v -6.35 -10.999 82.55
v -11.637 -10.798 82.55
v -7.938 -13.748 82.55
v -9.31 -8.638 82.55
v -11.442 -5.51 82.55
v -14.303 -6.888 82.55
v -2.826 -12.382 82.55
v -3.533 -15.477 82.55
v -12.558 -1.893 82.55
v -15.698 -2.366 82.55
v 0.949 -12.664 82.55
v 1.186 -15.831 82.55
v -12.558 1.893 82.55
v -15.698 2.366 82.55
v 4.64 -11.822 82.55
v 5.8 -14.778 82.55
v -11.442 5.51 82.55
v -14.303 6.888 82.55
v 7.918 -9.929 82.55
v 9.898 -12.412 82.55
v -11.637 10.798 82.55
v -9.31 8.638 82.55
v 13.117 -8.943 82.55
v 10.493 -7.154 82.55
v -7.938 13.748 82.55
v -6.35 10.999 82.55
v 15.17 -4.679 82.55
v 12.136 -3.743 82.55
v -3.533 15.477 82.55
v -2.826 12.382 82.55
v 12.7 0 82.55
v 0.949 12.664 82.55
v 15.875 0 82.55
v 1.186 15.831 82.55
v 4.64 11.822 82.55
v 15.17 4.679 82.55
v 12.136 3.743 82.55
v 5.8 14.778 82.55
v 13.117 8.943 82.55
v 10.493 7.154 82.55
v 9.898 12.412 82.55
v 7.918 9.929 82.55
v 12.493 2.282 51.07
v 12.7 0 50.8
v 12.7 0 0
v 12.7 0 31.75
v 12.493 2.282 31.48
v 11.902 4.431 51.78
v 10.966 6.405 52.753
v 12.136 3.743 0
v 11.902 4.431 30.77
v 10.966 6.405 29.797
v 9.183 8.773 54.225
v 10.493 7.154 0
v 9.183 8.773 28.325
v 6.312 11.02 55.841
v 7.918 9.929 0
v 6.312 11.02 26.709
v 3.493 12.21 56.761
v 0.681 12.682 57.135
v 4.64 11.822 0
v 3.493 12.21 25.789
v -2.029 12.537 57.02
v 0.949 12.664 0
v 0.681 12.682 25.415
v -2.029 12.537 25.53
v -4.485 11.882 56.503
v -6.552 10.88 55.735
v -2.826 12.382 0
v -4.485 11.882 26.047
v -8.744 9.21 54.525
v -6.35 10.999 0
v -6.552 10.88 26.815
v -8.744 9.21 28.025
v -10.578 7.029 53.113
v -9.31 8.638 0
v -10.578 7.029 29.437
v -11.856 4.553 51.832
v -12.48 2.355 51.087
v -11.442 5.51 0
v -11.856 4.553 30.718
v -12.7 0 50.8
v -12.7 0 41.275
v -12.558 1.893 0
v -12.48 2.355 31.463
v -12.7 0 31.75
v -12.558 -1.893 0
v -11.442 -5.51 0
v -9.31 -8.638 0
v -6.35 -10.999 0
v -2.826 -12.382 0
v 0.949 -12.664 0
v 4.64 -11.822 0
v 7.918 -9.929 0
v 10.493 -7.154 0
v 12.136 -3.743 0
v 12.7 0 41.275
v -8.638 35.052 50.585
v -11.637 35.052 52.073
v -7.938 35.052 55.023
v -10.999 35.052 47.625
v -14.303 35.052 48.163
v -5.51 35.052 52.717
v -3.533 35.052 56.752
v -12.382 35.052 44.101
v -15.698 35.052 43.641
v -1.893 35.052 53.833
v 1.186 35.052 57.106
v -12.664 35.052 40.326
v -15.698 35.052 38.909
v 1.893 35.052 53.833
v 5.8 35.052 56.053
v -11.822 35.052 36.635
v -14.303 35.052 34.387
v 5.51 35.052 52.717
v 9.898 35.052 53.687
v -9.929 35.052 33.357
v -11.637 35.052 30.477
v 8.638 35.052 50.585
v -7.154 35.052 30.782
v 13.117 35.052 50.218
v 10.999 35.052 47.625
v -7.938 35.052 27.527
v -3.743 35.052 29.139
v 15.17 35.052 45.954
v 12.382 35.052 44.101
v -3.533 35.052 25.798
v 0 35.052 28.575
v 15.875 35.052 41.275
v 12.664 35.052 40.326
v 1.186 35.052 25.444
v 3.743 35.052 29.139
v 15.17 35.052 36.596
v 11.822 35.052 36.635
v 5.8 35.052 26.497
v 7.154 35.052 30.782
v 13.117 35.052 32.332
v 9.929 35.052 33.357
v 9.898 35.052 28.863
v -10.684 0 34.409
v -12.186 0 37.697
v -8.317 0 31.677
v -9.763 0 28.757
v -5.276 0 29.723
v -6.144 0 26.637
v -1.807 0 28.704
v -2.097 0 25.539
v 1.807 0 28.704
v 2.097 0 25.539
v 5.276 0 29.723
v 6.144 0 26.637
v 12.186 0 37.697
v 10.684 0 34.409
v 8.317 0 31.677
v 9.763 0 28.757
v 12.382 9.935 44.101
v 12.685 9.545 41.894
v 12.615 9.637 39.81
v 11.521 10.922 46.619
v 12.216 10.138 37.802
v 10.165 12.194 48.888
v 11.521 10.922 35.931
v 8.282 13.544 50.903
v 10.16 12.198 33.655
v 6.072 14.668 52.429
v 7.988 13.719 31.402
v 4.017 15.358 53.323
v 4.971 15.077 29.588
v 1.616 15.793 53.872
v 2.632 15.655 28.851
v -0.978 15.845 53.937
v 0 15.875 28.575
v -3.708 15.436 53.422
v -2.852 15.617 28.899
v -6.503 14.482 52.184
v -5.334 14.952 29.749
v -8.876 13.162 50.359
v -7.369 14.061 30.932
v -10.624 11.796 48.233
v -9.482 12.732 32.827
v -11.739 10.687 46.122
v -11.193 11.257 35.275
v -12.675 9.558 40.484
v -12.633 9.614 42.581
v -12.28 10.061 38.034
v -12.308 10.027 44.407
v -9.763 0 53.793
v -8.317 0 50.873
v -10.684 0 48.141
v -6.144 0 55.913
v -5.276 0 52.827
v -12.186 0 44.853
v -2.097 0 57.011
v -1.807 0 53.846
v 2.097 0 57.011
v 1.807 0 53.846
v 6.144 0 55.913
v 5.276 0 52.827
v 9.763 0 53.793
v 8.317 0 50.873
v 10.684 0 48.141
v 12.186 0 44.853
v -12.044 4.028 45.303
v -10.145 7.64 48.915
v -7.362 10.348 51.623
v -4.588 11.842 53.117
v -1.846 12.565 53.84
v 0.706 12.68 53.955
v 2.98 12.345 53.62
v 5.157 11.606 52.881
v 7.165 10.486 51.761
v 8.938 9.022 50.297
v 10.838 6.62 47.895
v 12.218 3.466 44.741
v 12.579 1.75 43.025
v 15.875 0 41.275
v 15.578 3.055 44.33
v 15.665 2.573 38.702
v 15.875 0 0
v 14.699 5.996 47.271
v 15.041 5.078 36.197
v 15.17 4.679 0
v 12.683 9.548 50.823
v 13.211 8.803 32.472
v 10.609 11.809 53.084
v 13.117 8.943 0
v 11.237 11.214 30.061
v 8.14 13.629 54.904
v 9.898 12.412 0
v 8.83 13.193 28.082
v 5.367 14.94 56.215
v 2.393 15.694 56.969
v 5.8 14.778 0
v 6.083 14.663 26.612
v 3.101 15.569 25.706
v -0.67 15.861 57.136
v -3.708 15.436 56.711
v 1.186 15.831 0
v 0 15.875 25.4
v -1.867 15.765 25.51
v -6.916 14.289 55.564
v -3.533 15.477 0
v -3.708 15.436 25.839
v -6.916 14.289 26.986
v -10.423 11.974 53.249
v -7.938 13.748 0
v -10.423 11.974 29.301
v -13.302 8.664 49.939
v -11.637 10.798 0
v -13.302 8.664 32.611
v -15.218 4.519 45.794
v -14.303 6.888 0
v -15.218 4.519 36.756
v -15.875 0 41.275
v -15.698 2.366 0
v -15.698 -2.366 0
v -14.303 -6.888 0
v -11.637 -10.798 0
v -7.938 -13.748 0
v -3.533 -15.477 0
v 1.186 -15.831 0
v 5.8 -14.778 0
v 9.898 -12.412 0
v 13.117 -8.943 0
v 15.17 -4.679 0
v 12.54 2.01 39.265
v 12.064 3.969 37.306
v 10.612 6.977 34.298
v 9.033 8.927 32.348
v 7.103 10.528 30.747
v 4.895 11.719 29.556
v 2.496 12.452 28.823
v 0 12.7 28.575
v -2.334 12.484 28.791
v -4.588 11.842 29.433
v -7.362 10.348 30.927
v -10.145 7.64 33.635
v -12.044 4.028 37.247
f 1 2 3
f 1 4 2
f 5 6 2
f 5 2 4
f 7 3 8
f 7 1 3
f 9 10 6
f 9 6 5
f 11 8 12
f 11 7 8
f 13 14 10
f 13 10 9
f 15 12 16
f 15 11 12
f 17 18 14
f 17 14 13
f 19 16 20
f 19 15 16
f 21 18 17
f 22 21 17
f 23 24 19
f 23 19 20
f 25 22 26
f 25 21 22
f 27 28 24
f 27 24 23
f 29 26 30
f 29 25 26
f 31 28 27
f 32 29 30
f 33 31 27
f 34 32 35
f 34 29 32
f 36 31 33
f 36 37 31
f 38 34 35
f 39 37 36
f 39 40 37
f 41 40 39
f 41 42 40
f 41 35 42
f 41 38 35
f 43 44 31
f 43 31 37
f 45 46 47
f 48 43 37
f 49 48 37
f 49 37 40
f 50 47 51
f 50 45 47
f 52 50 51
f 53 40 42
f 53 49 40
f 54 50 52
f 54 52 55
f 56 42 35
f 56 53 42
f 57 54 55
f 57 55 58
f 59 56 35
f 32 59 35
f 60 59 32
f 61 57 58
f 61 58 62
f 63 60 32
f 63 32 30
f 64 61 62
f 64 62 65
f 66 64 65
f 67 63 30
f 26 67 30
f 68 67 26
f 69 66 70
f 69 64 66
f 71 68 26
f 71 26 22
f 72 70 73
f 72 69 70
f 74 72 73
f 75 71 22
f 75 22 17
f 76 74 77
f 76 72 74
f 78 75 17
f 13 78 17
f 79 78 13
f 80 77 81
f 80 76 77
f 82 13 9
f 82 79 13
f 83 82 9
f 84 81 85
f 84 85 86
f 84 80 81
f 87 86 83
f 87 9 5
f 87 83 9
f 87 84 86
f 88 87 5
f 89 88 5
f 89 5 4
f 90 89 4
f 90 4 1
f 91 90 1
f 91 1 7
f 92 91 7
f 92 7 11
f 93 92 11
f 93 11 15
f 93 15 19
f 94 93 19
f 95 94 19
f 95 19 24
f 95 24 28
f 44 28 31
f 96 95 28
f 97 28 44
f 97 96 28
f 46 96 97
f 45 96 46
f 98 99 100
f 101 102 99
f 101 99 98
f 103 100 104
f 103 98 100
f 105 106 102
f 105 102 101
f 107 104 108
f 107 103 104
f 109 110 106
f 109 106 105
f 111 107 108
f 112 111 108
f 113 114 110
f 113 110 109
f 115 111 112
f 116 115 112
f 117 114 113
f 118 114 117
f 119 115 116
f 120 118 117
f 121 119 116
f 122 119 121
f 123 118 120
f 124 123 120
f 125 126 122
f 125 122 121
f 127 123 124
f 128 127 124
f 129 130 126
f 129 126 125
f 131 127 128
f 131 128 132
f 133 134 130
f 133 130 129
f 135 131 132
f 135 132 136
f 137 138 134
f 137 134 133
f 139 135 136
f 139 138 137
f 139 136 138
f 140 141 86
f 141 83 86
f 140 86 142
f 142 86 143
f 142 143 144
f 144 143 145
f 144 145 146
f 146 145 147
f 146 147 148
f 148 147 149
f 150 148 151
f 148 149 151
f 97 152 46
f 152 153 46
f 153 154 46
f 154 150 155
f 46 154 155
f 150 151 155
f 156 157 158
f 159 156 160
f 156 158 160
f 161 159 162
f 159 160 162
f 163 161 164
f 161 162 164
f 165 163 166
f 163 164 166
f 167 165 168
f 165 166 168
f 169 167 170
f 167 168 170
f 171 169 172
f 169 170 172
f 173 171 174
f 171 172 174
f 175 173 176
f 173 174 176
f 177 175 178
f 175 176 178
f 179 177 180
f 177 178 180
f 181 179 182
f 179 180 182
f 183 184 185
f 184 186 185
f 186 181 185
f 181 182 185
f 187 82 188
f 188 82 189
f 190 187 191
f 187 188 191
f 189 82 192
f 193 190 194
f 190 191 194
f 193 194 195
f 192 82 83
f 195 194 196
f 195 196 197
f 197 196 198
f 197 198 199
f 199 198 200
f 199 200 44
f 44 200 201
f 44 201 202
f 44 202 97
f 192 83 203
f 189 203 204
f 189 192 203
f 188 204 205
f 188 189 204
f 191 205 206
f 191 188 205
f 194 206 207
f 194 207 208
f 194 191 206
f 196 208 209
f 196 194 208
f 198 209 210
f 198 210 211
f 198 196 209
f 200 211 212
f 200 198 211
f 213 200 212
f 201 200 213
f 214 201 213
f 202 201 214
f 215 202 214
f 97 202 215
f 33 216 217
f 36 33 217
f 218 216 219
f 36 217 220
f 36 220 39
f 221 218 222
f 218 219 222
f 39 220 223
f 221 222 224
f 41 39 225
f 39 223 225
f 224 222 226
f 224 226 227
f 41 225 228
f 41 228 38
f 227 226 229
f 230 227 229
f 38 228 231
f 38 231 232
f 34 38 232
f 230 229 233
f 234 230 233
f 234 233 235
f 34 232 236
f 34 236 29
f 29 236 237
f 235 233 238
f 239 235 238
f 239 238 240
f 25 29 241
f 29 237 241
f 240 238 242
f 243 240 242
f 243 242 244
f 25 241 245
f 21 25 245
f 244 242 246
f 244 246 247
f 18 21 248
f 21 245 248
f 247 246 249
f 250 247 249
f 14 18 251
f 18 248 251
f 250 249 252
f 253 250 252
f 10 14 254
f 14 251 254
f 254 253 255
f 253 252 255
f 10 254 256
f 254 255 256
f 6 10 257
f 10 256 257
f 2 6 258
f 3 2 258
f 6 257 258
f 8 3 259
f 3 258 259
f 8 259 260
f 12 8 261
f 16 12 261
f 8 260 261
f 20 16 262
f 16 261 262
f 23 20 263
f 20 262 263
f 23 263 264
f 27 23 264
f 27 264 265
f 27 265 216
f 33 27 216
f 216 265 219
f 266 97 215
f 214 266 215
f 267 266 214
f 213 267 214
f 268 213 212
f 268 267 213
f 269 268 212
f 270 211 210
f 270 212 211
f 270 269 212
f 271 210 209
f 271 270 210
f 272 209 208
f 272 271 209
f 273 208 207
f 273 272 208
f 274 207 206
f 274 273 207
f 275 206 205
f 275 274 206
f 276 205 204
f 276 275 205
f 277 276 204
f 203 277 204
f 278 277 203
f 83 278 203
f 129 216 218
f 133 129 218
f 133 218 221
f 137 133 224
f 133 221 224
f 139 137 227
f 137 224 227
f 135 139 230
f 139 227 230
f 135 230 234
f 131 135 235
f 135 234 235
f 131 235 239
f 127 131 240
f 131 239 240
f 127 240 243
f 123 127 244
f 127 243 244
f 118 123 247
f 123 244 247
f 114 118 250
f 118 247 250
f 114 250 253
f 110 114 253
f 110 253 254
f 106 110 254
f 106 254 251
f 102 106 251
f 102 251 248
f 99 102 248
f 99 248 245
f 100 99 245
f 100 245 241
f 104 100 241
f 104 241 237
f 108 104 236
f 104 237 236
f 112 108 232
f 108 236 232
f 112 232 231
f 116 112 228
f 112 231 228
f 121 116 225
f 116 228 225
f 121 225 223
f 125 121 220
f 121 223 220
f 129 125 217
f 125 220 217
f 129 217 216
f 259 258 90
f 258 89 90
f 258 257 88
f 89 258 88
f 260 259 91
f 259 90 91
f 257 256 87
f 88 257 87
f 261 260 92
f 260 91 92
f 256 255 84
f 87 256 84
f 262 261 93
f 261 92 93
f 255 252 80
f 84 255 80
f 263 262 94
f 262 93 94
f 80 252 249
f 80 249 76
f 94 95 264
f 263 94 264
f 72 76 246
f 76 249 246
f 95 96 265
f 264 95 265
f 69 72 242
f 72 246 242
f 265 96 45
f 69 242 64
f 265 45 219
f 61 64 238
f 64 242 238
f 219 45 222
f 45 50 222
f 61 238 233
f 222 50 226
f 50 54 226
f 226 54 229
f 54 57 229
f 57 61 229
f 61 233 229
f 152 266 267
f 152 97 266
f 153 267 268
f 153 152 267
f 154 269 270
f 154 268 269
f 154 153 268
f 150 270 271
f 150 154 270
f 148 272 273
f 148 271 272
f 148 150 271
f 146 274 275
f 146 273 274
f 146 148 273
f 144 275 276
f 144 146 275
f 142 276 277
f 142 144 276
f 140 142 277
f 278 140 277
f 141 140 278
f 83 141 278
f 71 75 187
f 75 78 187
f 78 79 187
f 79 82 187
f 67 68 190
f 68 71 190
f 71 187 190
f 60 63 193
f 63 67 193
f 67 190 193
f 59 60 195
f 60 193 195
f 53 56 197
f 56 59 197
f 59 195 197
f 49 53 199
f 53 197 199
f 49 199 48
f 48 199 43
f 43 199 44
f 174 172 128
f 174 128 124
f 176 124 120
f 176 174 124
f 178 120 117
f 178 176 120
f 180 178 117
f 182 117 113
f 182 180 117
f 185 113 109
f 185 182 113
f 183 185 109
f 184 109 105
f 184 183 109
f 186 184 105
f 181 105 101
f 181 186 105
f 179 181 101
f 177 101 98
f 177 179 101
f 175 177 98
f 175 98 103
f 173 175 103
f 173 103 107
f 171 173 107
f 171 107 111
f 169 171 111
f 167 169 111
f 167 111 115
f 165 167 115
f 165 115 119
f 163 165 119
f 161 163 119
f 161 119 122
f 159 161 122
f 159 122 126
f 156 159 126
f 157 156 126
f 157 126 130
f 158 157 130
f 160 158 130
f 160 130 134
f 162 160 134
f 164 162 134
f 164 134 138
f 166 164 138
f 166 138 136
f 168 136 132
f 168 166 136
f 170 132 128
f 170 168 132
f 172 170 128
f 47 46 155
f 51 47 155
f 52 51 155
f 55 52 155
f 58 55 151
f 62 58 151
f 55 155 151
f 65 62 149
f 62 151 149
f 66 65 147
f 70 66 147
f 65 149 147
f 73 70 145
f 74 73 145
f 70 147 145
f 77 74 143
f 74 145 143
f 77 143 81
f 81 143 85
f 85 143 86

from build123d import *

# Parameters (mm, degrees)
SKETCH1_R           = 15.875
SKETCH1_R_2         = 12.7
BOSS_EXTRUDE1_DEPTH = 82.55
SKETCH2_R           = 15.875
SKETCH2_R_2         = 12.7
BOSS_EXTRUDE2_DEPTH = 35.052


with BuildPart() as part:
    # Sketch1 → Boss-Extrude1 (new body)
    with BuildSketch(Plane.XY):
        Circle(SKETCH1_R)
        Circle(SKETCH1_R_2, mode=Mode.SUBTRACT)
    extrude(amount=BOSS_EXTRUDE1_DEPTH)

    # Sketch2 → Boss-Extrude2 (add)
    with BuildSketch(Plane(origin=(0, 0, 0), x_dir=(1, 0, 0), z_dir=(0, 1, 0))):
        with Locations((0, -41.275)):
            Circle(SKETCH2_R)
        with Locations(Location((0, -41.275, 0), (0, 0, 90))):
            Circle(SKETCH2_R_2, mode=Mode.SUBTRACT)
    extrude(amount=BOSS_EXTRUDE2_DEPTH)


solid = part.part
